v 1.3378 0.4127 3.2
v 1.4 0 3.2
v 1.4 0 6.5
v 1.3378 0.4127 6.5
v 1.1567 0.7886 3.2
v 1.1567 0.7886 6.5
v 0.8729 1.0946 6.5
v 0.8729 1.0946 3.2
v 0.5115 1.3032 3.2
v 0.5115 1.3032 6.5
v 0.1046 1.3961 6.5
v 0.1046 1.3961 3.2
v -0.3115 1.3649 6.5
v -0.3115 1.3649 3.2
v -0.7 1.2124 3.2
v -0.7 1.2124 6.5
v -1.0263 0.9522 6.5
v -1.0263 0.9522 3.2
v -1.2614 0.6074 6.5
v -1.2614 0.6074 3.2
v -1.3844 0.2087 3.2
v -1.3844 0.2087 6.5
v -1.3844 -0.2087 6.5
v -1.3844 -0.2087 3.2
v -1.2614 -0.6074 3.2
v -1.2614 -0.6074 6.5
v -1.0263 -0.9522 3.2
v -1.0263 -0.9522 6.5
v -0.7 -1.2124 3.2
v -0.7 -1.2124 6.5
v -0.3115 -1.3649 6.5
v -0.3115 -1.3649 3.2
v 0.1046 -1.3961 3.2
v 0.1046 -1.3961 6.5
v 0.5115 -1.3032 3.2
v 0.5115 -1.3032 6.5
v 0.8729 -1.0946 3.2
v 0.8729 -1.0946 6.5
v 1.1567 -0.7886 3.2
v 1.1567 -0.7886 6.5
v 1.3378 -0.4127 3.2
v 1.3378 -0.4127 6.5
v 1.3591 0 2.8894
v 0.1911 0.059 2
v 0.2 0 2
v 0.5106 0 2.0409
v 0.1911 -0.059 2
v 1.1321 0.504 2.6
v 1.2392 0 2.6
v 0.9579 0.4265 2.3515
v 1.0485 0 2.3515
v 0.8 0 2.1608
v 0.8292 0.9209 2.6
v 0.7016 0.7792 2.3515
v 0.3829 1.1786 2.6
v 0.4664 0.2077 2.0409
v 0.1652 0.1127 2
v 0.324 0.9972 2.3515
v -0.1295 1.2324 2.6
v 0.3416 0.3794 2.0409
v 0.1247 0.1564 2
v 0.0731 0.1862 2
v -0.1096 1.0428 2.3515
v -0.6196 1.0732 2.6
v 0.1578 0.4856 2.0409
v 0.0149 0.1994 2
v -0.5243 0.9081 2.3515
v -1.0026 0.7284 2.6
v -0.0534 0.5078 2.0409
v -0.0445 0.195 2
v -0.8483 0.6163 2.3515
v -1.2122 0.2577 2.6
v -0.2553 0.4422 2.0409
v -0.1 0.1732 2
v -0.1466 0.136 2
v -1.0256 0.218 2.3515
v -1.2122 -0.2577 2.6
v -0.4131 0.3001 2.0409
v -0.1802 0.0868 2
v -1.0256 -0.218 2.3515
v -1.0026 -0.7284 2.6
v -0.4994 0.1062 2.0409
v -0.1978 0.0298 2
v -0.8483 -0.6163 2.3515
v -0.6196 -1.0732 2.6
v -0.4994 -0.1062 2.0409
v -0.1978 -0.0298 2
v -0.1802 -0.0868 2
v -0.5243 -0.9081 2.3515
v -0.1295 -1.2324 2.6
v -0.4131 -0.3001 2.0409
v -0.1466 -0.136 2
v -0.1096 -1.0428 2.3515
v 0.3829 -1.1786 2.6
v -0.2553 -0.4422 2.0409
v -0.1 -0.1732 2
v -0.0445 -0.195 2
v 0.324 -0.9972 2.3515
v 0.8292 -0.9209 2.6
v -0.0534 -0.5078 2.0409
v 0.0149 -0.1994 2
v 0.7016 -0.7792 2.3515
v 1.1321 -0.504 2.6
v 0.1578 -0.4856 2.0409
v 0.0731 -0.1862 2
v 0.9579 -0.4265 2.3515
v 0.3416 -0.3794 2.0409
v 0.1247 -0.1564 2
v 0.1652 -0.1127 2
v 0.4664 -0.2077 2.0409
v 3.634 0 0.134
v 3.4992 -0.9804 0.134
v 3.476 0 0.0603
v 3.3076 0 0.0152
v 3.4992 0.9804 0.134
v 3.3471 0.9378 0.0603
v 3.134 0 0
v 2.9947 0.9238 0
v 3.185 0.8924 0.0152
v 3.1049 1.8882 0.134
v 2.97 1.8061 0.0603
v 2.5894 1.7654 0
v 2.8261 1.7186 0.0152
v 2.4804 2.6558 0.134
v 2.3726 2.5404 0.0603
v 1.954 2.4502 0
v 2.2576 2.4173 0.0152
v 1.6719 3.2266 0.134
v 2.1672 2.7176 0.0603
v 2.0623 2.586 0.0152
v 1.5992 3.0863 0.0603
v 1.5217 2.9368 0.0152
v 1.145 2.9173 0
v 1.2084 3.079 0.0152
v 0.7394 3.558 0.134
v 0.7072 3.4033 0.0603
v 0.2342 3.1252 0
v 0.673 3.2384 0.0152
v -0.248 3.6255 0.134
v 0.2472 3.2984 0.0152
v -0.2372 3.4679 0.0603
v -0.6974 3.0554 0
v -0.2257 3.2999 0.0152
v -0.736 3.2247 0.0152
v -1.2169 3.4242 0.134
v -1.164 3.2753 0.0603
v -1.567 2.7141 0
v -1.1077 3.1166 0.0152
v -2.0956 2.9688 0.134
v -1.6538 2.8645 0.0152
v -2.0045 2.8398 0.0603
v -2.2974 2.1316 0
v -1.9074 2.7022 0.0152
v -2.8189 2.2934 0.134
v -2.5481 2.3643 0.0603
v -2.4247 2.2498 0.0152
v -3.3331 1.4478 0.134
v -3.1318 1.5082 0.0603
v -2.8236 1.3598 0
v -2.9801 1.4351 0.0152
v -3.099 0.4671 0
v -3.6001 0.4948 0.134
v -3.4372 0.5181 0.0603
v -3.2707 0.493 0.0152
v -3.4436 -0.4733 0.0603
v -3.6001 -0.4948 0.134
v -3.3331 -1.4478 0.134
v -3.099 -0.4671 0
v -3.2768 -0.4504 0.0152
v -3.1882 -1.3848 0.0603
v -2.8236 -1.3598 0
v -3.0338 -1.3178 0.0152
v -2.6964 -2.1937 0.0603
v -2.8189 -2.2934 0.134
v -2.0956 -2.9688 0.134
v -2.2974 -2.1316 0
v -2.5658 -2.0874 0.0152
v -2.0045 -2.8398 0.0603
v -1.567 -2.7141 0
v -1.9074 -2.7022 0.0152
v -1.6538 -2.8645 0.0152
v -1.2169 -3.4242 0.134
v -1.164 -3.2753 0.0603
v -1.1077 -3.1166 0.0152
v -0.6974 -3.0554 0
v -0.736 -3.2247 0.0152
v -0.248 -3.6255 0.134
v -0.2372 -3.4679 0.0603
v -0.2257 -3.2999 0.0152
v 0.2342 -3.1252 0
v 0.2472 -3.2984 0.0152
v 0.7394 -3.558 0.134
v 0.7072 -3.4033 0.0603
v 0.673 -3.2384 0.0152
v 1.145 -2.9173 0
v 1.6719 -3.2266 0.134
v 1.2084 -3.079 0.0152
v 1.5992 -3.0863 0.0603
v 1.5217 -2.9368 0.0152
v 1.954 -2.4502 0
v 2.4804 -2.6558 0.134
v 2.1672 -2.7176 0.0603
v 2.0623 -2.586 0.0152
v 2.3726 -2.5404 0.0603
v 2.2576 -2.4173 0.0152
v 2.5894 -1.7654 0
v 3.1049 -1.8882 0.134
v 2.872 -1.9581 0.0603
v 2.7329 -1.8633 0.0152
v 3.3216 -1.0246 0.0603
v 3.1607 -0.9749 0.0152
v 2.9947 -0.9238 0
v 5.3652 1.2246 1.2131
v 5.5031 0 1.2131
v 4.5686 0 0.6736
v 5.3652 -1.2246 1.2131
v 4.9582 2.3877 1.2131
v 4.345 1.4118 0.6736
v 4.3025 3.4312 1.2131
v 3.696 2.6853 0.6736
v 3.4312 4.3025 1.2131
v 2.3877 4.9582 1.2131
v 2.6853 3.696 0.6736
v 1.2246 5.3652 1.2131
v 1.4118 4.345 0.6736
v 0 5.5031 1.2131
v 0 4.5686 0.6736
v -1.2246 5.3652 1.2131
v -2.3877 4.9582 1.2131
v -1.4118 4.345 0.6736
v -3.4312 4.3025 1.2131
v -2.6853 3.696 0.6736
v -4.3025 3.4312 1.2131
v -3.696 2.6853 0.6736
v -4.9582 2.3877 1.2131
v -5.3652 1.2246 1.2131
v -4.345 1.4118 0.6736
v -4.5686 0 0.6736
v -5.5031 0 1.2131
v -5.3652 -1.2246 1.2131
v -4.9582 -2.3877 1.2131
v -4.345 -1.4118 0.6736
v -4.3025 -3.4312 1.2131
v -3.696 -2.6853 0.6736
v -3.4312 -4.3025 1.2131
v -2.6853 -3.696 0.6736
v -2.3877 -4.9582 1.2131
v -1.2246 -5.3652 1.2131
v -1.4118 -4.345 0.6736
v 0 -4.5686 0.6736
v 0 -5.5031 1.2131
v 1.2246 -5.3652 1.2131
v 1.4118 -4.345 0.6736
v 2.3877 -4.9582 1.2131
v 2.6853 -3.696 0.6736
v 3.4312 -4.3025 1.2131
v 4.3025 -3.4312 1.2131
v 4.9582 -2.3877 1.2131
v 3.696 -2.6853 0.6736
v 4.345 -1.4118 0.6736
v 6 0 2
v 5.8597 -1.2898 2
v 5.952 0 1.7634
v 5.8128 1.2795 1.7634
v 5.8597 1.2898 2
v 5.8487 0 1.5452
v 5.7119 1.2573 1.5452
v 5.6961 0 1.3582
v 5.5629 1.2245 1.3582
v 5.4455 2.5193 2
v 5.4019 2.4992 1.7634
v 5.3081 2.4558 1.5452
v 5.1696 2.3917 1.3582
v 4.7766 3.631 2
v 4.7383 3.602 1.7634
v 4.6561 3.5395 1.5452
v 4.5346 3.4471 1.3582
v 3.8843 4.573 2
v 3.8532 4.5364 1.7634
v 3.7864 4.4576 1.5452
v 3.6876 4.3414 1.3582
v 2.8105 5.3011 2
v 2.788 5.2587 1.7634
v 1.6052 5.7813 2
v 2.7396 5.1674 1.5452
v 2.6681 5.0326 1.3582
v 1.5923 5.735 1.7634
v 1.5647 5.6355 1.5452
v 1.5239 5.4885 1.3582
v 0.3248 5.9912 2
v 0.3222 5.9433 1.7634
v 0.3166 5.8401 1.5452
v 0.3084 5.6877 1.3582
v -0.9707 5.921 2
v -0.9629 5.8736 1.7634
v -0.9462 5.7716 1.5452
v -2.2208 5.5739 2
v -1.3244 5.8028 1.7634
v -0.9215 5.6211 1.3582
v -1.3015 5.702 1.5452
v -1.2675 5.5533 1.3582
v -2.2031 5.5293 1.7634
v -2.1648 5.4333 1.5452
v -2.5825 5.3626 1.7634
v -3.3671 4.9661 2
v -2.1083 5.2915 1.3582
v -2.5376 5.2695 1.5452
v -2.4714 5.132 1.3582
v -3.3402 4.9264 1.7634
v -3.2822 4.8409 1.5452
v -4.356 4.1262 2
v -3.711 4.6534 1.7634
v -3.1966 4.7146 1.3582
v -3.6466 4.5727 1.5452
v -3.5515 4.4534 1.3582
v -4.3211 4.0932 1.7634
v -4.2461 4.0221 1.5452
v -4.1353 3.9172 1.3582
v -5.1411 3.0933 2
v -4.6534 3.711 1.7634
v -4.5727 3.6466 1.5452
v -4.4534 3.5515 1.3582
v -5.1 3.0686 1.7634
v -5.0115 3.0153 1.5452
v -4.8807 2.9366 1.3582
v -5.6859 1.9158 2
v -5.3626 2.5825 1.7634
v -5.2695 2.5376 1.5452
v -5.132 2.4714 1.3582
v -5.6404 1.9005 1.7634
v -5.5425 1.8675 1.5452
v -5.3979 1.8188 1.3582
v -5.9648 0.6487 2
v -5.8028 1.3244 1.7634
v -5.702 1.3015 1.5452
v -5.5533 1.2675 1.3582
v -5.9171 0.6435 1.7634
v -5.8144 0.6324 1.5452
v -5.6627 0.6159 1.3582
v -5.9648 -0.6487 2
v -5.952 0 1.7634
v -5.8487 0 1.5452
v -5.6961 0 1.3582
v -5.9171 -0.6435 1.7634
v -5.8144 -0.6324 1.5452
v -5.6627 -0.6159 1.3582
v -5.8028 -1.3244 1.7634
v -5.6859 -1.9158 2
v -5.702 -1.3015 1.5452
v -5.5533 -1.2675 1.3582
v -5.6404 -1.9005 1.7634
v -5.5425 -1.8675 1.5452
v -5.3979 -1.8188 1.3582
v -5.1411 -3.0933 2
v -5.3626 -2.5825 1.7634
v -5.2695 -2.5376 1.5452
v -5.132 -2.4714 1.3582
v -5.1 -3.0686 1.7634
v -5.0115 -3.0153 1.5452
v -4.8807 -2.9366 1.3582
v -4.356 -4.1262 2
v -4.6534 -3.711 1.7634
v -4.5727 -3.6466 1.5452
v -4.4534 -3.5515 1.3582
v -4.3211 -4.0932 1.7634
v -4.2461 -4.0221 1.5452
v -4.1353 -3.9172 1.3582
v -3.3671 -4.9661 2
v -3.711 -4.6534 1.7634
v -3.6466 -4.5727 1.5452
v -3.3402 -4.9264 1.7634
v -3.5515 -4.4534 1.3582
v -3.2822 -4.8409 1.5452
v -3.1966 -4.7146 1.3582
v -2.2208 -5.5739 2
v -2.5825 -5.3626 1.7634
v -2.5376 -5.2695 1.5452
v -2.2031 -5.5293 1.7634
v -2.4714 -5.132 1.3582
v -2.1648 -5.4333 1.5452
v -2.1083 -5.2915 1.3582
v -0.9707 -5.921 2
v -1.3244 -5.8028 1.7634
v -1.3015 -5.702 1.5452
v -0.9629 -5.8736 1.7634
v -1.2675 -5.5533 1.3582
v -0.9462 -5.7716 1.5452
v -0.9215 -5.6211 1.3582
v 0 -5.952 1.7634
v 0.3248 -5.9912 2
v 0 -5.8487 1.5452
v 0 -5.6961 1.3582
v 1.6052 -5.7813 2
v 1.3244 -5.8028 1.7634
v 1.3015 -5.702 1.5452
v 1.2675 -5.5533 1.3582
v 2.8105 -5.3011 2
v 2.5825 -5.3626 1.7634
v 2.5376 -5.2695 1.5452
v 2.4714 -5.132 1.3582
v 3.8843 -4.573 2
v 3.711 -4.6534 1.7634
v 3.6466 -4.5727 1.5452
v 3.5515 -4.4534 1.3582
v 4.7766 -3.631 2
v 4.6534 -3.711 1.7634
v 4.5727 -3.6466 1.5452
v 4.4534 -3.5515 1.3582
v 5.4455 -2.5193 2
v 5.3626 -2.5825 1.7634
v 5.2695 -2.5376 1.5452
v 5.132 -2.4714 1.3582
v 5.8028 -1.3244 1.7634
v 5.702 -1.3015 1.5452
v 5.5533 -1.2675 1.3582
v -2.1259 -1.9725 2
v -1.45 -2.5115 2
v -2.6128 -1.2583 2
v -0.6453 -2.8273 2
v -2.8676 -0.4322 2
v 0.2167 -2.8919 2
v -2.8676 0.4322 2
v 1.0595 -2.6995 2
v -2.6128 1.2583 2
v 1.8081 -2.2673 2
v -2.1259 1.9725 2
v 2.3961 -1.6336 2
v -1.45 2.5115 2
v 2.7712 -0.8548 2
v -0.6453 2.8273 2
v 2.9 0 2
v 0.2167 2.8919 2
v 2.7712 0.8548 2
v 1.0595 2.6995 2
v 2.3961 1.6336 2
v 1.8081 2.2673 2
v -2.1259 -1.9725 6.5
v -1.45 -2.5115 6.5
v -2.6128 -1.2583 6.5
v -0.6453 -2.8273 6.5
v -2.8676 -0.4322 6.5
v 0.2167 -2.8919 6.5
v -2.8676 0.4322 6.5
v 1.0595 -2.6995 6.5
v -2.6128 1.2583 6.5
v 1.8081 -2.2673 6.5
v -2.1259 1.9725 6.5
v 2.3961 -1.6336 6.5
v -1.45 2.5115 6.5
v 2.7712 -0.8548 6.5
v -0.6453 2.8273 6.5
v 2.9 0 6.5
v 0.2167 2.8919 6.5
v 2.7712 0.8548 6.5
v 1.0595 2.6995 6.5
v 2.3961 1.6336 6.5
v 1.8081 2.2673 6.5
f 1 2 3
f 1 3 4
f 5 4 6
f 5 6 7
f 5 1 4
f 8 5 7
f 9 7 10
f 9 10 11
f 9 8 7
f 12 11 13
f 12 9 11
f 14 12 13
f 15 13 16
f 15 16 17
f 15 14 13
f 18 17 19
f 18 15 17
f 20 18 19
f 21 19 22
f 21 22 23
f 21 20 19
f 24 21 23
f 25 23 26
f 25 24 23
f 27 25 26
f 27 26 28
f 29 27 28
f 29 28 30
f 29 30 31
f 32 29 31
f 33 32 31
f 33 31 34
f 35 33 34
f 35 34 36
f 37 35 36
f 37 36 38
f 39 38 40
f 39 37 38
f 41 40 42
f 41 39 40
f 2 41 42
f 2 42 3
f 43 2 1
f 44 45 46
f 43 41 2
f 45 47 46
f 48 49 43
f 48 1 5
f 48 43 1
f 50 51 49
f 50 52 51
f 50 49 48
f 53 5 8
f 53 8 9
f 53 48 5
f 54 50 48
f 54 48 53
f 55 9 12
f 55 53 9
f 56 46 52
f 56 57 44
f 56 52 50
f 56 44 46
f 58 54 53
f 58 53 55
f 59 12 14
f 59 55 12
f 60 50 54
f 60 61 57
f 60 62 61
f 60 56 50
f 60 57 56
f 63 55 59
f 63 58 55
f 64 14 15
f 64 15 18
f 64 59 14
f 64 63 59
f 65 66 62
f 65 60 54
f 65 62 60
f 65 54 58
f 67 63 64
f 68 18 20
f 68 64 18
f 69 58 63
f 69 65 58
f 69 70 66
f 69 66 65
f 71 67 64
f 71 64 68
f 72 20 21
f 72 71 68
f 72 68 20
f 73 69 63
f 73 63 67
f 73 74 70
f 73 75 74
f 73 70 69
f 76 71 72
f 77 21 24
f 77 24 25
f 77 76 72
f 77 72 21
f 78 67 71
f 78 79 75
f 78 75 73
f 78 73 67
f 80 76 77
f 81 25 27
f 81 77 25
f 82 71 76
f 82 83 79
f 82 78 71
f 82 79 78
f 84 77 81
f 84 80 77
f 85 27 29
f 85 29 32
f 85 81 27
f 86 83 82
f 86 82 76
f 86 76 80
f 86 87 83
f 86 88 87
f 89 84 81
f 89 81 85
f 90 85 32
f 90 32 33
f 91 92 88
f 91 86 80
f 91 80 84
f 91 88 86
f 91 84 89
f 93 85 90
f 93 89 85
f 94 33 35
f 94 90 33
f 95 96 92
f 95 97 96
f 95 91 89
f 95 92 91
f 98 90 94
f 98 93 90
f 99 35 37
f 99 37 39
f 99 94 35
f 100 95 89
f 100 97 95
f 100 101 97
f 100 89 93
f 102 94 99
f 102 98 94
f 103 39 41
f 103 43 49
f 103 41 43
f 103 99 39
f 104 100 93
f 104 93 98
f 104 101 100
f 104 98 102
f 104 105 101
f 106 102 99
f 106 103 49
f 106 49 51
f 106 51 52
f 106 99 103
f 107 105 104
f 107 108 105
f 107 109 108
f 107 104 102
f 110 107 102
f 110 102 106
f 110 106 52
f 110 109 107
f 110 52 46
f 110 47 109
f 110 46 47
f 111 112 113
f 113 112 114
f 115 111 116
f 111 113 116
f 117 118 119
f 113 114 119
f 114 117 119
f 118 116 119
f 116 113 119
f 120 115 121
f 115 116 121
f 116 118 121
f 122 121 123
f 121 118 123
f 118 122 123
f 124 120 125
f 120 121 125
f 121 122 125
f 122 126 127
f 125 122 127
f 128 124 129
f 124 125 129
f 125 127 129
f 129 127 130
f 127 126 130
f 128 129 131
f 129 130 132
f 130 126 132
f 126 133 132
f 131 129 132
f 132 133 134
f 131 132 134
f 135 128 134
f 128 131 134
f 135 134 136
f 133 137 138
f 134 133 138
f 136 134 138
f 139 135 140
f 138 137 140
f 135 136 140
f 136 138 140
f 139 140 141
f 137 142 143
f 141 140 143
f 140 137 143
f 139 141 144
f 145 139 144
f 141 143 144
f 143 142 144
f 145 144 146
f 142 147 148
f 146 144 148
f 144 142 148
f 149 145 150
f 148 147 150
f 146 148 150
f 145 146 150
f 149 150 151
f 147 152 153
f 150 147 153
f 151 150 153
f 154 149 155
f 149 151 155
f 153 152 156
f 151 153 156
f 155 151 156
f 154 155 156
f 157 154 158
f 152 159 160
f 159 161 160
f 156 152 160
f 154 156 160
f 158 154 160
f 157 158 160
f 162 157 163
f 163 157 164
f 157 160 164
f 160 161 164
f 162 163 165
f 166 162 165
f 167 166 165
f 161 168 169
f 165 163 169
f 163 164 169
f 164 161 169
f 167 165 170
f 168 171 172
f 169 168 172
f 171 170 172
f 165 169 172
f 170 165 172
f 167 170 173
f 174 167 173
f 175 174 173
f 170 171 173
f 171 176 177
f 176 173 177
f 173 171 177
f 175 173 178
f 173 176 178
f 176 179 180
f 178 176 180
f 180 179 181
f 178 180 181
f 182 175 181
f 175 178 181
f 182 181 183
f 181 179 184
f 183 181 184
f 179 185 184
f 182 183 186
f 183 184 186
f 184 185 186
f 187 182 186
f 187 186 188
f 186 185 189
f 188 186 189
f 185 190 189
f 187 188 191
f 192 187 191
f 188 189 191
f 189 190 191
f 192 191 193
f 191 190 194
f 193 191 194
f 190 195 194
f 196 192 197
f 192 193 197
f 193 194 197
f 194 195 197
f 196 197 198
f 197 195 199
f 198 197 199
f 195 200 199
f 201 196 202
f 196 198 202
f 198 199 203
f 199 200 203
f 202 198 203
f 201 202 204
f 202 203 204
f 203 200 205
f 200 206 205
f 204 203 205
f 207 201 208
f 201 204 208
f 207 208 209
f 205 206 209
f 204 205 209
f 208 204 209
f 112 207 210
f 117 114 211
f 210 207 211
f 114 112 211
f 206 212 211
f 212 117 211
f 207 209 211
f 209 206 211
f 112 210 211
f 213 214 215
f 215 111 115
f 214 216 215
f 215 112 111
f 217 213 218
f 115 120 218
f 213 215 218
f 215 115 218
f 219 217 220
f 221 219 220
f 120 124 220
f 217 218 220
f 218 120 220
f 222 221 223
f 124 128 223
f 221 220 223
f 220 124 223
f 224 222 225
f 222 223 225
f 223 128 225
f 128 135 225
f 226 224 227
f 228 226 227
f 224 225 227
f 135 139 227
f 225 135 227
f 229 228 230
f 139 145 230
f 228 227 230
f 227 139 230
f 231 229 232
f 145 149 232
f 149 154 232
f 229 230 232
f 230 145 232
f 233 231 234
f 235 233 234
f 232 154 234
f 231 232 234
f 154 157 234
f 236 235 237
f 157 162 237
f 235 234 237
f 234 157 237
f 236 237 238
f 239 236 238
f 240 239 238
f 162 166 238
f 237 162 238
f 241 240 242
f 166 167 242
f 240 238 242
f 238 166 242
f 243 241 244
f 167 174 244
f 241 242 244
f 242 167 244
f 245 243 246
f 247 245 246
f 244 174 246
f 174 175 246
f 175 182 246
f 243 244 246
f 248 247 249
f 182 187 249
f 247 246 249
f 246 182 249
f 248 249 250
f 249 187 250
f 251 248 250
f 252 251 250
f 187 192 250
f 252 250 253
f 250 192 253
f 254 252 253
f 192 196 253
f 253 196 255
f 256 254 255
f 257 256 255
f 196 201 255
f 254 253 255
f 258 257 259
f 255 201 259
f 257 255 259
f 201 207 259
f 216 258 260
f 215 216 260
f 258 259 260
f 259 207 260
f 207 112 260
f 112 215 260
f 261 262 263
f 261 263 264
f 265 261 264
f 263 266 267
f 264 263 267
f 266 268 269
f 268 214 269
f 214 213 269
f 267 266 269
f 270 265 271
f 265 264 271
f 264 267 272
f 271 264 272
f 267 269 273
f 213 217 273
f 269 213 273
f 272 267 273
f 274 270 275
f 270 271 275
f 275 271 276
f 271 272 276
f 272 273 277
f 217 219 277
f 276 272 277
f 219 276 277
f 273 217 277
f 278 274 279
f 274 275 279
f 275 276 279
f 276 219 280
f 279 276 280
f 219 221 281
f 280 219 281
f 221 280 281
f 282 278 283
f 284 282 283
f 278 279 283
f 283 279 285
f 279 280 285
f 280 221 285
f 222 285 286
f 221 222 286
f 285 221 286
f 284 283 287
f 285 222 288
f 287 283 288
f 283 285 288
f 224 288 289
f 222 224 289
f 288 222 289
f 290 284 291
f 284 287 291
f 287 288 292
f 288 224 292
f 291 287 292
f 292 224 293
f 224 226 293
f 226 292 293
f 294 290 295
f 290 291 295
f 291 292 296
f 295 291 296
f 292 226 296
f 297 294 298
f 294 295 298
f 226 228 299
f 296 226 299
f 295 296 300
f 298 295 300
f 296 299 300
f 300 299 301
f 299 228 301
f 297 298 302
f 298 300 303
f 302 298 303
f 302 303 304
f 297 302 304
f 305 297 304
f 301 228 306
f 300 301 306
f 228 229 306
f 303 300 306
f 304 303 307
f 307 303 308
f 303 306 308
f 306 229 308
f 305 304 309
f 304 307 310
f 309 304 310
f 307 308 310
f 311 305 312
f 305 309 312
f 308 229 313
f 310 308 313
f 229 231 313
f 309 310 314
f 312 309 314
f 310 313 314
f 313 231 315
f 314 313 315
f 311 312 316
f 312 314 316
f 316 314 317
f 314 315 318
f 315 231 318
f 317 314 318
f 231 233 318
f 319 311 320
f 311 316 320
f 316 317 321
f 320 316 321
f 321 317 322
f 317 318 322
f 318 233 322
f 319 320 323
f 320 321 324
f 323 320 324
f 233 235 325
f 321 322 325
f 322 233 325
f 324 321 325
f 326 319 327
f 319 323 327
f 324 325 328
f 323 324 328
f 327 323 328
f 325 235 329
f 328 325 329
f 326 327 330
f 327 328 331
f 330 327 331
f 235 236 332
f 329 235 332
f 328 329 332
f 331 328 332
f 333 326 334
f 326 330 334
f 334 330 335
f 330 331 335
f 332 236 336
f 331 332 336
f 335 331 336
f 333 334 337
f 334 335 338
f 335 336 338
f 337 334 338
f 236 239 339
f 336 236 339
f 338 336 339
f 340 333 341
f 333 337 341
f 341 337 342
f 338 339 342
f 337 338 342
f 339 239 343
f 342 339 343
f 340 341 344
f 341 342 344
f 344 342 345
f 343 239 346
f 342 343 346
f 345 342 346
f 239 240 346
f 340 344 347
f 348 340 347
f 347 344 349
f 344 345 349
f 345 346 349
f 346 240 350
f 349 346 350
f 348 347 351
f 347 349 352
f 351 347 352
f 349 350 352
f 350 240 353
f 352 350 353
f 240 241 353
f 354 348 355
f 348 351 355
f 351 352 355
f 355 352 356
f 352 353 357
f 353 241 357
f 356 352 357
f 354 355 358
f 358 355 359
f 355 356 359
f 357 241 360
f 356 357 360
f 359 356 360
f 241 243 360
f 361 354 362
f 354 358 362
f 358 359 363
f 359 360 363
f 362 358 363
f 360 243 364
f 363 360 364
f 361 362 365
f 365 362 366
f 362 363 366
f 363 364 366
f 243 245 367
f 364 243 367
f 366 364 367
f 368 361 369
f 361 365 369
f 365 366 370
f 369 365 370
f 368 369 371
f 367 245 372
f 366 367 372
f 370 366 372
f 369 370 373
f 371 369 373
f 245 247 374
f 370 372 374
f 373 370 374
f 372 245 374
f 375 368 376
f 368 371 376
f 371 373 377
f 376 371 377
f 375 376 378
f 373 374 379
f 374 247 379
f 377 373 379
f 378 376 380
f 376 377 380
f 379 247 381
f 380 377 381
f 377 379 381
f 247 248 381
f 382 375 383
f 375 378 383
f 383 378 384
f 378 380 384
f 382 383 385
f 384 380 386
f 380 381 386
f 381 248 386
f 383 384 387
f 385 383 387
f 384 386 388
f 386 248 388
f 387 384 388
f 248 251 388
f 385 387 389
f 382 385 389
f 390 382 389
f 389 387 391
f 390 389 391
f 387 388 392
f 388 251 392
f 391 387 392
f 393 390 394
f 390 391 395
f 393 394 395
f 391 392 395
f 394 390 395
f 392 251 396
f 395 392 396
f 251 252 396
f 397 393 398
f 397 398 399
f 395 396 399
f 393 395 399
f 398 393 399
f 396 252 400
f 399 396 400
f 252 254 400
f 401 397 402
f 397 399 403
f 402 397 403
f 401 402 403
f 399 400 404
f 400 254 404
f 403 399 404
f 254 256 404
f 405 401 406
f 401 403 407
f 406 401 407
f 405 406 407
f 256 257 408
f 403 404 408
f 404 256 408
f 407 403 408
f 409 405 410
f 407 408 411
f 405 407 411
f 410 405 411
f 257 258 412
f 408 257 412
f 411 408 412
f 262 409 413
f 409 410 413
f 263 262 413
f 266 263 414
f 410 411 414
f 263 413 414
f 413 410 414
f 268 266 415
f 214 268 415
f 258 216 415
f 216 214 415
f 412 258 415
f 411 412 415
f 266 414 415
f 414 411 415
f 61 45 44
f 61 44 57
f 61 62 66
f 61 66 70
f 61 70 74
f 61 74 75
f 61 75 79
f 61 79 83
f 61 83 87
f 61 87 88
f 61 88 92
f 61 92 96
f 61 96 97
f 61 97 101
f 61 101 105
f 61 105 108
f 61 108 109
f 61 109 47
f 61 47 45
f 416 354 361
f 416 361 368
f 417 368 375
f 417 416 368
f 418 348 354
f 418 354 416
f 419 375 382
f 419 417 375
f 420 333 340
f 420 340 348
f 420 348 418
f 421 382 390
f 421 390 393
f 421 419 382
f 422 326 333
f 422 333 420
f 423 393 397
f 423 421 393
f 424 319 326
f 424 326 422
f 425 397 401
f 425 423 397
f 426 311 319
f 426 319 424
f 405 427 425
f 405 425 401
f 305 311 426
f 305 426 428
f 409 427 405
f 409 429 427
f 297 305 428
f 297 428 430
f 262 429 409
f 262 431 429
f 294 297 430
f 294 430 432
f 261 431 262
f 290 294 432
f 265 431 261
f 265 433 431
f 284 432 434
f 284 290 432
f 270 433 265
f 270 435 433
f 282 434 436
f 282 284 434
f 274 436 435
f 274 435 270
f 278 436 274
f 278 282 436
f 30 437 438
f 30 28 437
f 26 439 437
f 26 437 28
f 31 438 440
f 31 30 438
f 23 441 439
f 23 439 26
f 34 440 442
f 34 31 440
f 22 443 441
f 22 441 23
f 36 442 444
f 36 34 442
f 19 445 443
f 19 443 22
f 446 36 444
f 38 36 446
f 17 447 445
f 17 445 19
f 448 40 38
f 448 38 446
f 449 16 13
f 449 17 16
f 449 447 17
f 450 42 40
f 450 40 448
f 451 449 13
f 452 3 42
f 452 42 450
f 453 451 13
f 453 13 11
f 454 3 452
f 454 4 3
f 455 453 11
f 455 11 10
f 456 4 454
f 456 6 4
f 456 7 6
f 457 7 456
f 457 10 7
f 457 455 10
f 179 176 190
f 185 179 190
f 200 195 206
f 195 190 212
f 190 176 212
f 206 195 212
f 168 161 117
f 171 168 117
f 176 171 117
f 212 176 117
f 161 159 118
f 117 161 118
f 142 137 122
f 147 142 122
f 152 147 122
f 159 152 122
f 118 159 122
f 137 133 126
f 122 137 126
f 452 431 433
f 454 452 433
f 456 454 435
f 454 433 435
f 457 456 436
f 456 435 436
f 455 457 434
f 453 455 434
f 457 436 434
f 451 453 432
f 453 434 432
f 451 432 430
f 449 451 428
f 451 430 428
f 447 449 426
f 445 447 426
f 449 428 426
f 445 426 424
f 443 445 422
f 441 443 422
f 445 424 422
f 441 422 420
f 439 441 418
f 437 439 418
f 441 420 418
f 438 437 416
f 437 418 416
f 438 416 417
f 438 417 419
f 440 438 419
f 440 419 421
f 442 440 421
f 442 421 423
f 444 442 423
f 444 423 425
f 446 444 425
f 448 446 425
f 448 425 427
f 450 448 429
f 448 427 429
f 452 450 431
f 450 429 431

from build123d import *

# Parameters (mm, degrees)
F0_R     = 6
F1_DEPTH = 2
F2_SIZE2 = 2.5980762114
F2_SIZE  = 1.5
F4_R     = 2.9
F4_R_2   = 1.4
F5_DEPTH = 4.5
F6_R     = 1.2


# Not quite as in the source:
# - a fillet or chamfer that OpenCascade refuses, or shapes differently, is made with other operations: its cross-section is extruded or revolved along the edge and cut away or added


with BuildPart() as f1:
    # F0 (on Top) → F1 (new body)
    with BuildSketch(Plane.XY):
        Circle(F0_R)
    extrude(amount=F1_DEPTH)

    # F2
    f2_edges = [f1.edges().sort_by_distance(p)[0] for p in [
        (-6, 0, 0),
    ]]
    f2_side = f1.faces().sort_by_distance((-6, 0, 1))[0]
    chamfer(f2_edges, length=F2_SIZE, length2=F2_SIZE2, reference=f2_side)

    # F3: fillet of radius 1 on 2 edges, made by hand

    # F3_s1 → F3_t2 (revolve, cut)
    with BuildSketch(Plane.XZ):
        with BuildLine():
            ThreePointArc((3.6339745962, 0.1339745962), (3.3927936413, 0.0340741737), (3.1339745962, 0))
            Line((3.1339745962, 0), (3.4019237886, 0))
            Line((3.4019237886, 0), (3.6339745962, 0.1339745962))
        make_face()
    revolve(axis=Axis((0, 0, 0), (0, 0, 1)), mode=Mode.SUBTRACT)

    # F3_s3 → F3_t4 (revolve, cut)
    with BuildSketch(Plane.XZ):
        with BuildLine():
            ThreePointArc((6, 2), (5.8486778537, 1.5452494356), (5.5031382462, 1.2131367327))
            Line((5.5031382462, 1.2131367327), (6, 1.5))
            Line((6, 1.5), (6, 2))
        make_face()
    revolve(axis=Axis((0, 0, 1.5), (0, 0, 1)), mode=Mode.SUBTRACT)

    # F4 (on face) → F5 (join)
    with BuildSketch(Plane.XY.offset(2)):
        Circle(F4_R)
        Circle(F4_R_2, mode=Mode.SUBTRACT)
    extrude(amount=F5_DEPTH)

    # F6
    f6_edges = [f1.edges().sort_by_distance(p)[0] for p in [
        (-1.4, 0, 2),
    ]]
    fillet(f6_edges, radius=F6_R)


solid = f1.part
